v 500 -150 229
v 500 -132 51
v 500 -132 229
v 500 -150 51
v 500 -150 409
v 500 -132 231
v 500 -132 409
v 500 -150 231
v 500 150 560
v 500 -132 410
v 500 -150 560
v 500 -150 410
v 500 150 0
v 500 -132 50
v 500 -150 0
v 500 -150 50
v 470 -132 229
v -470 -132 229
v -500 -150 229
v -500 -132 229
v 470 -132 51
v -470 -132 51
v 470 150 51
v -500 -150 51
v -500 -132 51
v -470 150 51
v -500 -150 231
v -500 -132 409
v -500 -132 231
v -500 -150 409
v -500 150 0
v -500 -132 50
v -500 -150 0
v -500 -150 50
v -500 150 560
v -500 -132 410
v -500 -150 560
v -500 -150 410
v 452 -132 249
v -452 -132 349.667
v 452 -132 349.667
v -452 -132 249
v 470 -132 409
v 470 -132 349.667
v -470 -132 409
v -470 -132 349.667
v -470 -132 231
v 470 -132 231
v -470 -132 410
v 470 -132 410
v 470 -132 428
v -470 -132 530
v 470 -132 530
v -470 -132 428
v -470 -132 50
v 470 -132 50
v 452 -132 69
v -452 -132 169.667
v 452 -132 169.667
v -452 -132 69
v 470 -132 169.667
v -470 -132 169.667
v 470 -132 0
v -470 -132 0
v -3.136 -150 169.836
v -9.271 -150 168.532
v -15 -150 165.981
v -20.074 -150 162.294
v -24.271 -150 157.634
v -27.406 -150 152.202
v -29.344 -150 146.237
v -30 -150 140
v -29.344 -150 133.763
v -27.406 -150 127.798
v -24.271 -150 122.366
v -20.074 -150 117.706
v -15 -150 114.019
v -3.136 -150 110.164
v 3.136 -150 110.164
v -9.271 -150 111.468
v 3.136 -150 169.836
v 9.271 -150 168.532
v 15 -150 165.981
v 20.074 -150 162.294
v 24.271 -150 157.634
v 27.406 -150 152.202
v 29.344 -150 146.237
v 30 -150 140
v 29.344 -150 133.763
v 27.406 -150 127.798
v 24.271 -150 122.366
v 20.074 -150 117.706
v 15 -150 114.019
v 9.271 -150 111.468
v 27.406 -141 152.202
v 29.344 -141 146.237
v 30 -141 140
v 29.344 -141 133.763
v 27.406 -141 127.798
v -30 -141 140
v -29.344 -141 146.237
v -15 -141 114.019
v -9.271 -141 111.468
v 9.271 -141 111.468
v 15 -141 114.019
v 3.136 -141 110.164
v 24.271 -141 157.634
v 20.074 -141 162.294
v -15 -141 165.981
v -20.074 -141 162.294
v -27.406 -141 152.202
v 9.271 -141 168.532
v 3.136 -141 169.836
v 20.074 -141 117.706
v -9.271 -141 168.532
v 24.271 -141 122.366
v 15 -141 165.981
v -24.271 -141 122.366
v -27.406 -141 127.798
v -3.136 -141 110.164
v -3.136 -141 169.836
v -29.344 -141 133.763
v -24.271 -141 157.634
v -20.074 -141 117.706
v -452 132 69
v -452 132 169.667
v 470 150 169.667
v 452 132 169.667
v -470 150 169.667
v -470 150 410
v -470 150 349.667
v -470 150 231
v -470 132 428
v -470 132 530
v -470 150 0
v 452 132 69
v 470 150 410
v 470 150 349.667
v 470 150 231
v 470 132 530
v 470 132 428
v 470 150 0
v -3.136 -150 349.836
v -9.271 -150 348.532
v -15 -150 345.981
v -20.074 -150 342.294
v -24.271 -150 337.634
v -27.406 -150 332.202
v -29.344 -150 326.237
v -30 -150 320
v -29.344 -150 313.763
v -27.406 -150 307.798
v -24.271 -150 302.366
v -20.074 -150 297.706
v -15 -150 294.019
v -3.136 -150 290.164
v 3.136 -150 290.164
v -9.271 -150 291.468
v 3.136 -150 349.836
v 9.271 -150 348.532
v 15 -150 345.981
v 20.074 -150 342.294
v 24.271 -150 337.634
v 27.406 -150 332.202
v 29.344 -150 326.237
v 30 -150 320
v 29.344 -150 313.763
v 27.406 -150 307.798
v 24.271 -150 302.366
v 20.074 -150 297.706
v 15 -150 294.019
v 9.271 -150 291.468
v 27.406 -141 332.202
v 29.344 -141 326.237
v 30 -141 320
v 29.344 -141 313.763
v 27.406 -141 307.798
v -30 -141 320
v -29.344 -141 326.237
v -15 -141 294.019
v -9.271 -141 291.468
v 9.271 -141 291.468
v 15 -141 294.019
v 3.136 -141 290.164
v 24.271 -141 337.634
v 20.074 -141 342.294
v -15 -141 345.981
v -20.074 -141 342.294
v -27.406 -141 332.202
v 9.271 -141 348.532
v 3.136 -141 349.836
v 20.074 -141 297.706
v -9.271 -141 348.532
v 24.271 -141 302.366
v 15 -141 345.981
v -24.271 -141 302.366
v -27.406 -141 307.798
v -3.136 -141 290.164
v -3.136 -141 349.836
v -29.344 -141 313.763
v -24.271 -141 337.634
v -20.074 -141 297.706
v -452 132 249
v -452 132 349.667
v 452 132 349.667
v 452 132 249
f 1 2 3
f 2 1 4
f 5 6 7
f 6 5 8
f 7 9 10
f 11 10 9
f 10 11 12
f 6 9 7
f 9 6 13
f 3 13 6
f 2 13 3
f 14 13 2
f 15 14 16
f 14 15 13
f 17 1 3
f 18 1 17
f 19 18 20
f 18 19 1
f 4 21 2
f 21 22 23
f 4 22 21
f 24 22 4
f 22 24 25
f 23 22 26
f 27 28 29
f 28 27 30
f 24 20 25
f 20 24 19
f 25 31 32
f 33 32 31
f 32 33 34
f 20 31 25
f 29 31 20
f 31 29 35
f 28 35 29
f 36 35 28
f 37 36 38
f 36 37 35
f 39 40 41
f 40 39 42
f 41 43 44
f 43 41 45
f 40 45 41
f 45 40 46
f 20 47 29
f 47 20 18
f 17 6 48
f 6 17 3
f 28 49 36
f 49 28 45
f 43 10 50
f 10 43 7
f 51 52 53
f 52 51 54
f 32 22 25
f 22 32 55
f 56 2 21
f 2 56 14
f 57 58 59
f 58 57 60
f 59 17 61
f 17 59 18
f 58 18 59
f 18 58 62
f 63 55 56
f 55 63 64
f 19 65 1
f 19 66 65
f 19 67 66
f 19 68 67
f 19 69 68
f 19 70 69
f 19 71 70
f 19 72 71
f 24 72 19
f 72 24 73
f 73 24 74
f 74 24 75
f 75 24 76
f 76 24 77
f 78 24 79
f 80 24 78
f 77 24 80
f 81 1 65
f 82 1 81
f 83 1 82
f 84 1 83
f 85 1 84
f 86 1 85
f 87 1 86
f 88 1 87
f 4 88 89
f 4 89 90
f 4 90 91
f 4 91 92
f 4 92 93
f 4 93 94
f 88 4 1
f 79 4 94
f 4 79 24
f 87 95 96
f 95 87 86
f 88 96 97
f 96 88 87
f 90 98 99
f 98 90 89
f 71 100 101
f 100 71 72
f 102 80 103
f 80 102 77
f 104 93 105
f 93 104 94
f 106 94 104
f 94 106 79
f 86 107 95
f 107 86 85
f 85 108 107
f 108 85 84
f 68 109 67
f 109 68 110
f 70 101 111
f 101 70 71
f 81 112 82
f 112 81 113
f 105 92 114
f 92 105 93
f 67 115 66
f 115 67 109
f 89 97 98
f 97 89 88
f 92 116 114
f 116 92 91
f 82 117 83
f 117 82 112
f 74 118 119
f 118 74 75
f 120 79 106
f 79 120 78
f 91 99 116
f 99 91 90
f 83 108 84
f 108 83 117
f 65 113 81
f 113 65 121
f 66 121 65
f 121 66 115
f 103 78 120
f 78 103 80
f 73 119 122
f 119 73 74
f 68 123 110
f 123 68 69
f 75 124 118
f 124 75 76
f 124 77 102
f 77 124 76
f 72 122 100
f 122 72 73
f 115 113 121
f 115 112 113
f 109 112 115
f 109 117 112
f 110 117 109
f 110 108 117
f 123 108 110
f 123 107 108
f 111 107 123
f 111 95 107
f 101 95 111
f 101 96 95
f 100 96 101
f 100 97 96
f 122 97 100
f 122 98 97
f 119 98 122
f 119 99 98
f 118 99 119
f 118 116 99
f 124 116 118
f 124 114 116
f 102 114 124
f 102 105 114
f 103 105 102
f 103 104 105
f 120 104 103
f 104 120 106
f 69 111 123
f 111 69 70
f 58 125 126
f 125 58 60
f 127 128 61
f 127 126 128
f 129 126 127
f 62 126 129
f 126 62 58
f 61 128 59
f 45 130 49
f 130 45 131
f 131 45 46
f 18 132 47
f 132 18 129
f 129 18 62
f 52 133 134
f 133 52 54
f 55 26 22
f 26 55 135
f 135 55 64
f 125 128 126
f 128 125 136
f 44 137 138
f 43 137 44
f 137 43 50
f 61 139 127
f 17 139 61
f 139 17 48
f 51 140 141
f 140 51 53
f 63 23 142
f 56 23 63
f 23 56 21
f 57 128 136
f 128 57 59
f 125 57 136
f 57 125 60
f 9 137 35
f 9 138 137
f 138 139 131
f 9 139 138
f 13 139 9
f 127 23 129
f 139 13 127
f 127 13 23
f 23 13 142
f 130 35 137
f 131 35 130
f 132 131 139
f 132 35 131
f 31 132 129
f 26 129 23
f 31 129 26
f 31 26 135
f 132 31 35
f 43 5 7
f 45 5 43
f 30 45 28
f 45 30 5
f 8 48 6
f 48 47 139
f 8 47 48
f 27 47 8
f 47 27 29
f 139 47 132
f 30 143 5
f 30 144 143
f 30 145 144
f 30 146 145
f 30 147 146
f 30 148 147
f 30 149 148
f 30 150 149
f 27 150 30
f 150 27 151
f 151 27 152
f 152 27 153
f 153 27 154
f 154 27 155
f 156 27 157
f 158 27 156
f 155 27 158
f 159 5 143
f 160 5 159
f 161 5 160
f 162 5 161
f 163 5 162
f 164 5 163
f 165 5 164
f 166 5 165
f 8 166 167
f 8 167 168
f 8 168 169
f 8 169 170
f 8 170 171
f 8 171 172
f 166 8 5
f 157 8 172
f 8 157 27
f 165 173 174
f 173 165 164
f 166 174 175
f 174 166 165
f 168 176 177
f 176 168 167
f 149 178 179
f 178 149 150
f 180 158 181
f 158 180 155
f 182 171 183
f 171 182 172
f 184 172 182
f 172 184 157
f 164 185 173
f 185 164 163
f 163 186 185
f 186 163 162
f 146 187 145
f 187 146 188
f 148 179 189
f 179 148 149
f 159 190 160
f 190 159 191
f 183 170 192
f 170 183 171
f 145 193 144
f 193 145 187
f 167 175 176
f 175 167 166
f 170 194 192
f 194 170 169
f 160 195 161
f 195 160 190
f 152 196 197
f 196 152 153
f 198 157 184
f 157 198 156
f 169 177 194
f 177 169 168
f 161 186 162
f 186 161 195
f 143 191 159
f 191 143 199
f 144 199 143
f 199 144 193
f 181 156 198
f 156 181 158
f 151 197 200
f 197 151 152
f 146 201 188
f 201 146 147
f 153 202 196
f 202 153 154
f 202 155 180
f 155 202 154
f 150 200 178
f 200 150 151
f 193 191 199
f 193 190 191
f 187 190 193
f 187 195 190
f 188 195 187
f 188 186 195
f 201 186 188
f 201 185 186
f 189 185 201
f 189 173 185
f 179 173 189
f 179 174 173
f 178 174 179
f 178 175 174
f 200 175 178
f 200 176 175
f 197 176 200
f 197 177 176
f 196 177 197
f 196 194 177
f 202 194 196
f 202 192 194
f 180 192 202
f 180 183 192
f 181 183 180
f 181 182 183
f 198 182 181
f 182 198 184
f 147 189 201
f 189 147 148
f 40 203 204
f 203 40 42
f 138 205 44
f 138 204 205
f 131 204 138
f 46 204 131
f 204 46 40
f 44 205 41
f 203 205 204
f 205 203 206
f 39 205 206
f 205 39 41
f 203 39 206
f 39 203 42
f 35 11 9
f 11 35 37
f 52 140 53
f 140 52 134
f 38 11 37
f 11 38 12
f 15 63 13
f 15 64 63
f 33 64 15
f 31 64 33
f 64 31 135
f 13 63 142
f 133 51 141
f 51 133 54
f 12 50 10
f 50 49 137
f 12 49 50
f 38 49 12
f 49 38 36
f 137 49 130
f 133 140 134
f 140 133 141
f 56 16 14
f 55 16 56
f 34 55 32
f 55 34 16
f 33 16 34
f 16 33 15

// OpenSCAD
// file: utils.scad
module drawer(width, height, depth, inset, front_thickness, side_thickness, back_thickness, bottom_thickness) {
  drawer_width = width;
  drawer_height = height - 2;
  drawer_depth = depth;
  side_offset = inset;
  inner_width = drawer_width - 2*side_offset;
  inner_depth = drawer_depth - front_thickness - back_thickness;
  side_height = (2/3)*drawer_height;
  translate([0, 0, 1]) {
    // Sides.
    translate([-inner_width/2 + side_thickness/2, (front_thickness - back_thickness)/2, side_height/2])
      color([0, 1, 0])
      cube([side_thickness, inner_depth, side_height], true);
    translate([inner_width/2 - side_thickness/2, (front_thickness - back_thickness)/2, side_height/2])
      color([0, 1, 0])
      cube([side_thickness, inner_depth, side_height], true);
    // Bottom.
    translate([0, (front_thickness - back_thickness)/2, bottom_thickness/2])
      color([1, 0, 0])
      cube([inner_width - 2*side_thickness, inner_depth, bottom_thickness], true);
    // Front/back.
    translate([0, drawer_depth/2 - back_thickness/2, side_height/2])
      cube([inner_width, back_thickness, side_height], true);
    difference() {
      translate([0, -drawer_depth/2 + front_thickness/2, drawer_height/2])
        cube([drawer_width, front_thickness, drawer_height], true);
      translate([0, -(drawer_depth + 100)/2 + front_thickness/2, drawer_height / 2])
        rotate([90, 0, 0])
        cylinder(100, 30, 30, true);
    }
  }
  echo("Drawer front: ", drawer_width, front_thickness, drawer_height);
  echo("Drawer back: ", inner_width, back_thickness, side_height);
  echo("Drawer side: ", side_thickness, inner_depth, side_height);
  echo("Drawer side: ", side_thickness, inner_depth, side_height);
  echo("Drawer bottom: ", inner_width - 2*side_thickness, inner_depth, bottom_thickness);
}
// main file
use <utils.scad>;

width = 1000;
height = 560;
bucket_height = 150;
depth = 300;
thick = 30;
thin_thick = 18;

shoe_pair_width = 220;
shoe_pair_depth = 350;
shoe_pair_height = 150;
boot_pair_height = 150;

module lid() {
  x = width;
  y = depth;
  z = thick;
  translate([0, 0, thick/2]) cube([x, y, z], true);
  echo("Lid: ", x, y ,z);
}

module side() {
  side_height = height - thick;
  side_depth = depth - thin_thick;
  translate([0, 0, side_height/2]) color([1, 0.5, 0.5]) cube([thick, side_depth, side_height], true);
  echo("Side: ", thick, side_depth, side_height);
}

module bottom() {
  x = width - 2*thick;
  y = depth - 2*thin_thick;
  z = thin_thick;
  translate([0, 0, thin_thick/2]) color([0.5, 1, 0.5]) cube([x, y, z], true);
  echo ("Bottom: ", x, y, z);
}

module front() {
  x = width;
  y = thin_thick;
  z = bucket_height - thick;
  translate([0, 0, z/2]) color([0.5, 0.5, 1]) cube([x, y, z], true);
  echo("Front: ", x, y, z);
}

module back() {
  x = width - 2*thick;
  y = thin_thick;
  z = bucket_height - thick;
  translate([0, 0, z/2]) color([0.5, 0.5, 1]) cube([x, y, z], true);
  echo("Back: ", x, y, z);
}

translate([0, 0, height - thick]) lid();
translate([-width/2 + thick/2, thin_thick/2, 0]) side();
translate([+width/2 - thick/2, thin_thick/2, 0]) side();
translate([0, 0, height - bucket_height]) bottom();
translate([0, depth/2 - thin_thick/2, height - bucket_height]) back();
translate([0, -depth/2 + thin_thick/2, height - bucket_height]) front();

translate([0, 0, 50]) drawer(width, (height - bucket_height - 50) / 2, depth, thick, thin_thick, thin_thick, thin_thick, thin_thick);
translate([0, 0, 50 + (height - bucket_height - 50)/2]) drawer(width, (height - bucket_height - 50) / 2, depth, thick, thin_thick, thin_thick, thin_thick, thin_thick);

translate([0, -depth/2 + thin_thick/2, 25]) cube([width, thin_thick, 50], true);
echo("Lower front: ", width, thin_thick, 50);

// translate([0, 0, height/2]) cube([width, depth, height], true);
